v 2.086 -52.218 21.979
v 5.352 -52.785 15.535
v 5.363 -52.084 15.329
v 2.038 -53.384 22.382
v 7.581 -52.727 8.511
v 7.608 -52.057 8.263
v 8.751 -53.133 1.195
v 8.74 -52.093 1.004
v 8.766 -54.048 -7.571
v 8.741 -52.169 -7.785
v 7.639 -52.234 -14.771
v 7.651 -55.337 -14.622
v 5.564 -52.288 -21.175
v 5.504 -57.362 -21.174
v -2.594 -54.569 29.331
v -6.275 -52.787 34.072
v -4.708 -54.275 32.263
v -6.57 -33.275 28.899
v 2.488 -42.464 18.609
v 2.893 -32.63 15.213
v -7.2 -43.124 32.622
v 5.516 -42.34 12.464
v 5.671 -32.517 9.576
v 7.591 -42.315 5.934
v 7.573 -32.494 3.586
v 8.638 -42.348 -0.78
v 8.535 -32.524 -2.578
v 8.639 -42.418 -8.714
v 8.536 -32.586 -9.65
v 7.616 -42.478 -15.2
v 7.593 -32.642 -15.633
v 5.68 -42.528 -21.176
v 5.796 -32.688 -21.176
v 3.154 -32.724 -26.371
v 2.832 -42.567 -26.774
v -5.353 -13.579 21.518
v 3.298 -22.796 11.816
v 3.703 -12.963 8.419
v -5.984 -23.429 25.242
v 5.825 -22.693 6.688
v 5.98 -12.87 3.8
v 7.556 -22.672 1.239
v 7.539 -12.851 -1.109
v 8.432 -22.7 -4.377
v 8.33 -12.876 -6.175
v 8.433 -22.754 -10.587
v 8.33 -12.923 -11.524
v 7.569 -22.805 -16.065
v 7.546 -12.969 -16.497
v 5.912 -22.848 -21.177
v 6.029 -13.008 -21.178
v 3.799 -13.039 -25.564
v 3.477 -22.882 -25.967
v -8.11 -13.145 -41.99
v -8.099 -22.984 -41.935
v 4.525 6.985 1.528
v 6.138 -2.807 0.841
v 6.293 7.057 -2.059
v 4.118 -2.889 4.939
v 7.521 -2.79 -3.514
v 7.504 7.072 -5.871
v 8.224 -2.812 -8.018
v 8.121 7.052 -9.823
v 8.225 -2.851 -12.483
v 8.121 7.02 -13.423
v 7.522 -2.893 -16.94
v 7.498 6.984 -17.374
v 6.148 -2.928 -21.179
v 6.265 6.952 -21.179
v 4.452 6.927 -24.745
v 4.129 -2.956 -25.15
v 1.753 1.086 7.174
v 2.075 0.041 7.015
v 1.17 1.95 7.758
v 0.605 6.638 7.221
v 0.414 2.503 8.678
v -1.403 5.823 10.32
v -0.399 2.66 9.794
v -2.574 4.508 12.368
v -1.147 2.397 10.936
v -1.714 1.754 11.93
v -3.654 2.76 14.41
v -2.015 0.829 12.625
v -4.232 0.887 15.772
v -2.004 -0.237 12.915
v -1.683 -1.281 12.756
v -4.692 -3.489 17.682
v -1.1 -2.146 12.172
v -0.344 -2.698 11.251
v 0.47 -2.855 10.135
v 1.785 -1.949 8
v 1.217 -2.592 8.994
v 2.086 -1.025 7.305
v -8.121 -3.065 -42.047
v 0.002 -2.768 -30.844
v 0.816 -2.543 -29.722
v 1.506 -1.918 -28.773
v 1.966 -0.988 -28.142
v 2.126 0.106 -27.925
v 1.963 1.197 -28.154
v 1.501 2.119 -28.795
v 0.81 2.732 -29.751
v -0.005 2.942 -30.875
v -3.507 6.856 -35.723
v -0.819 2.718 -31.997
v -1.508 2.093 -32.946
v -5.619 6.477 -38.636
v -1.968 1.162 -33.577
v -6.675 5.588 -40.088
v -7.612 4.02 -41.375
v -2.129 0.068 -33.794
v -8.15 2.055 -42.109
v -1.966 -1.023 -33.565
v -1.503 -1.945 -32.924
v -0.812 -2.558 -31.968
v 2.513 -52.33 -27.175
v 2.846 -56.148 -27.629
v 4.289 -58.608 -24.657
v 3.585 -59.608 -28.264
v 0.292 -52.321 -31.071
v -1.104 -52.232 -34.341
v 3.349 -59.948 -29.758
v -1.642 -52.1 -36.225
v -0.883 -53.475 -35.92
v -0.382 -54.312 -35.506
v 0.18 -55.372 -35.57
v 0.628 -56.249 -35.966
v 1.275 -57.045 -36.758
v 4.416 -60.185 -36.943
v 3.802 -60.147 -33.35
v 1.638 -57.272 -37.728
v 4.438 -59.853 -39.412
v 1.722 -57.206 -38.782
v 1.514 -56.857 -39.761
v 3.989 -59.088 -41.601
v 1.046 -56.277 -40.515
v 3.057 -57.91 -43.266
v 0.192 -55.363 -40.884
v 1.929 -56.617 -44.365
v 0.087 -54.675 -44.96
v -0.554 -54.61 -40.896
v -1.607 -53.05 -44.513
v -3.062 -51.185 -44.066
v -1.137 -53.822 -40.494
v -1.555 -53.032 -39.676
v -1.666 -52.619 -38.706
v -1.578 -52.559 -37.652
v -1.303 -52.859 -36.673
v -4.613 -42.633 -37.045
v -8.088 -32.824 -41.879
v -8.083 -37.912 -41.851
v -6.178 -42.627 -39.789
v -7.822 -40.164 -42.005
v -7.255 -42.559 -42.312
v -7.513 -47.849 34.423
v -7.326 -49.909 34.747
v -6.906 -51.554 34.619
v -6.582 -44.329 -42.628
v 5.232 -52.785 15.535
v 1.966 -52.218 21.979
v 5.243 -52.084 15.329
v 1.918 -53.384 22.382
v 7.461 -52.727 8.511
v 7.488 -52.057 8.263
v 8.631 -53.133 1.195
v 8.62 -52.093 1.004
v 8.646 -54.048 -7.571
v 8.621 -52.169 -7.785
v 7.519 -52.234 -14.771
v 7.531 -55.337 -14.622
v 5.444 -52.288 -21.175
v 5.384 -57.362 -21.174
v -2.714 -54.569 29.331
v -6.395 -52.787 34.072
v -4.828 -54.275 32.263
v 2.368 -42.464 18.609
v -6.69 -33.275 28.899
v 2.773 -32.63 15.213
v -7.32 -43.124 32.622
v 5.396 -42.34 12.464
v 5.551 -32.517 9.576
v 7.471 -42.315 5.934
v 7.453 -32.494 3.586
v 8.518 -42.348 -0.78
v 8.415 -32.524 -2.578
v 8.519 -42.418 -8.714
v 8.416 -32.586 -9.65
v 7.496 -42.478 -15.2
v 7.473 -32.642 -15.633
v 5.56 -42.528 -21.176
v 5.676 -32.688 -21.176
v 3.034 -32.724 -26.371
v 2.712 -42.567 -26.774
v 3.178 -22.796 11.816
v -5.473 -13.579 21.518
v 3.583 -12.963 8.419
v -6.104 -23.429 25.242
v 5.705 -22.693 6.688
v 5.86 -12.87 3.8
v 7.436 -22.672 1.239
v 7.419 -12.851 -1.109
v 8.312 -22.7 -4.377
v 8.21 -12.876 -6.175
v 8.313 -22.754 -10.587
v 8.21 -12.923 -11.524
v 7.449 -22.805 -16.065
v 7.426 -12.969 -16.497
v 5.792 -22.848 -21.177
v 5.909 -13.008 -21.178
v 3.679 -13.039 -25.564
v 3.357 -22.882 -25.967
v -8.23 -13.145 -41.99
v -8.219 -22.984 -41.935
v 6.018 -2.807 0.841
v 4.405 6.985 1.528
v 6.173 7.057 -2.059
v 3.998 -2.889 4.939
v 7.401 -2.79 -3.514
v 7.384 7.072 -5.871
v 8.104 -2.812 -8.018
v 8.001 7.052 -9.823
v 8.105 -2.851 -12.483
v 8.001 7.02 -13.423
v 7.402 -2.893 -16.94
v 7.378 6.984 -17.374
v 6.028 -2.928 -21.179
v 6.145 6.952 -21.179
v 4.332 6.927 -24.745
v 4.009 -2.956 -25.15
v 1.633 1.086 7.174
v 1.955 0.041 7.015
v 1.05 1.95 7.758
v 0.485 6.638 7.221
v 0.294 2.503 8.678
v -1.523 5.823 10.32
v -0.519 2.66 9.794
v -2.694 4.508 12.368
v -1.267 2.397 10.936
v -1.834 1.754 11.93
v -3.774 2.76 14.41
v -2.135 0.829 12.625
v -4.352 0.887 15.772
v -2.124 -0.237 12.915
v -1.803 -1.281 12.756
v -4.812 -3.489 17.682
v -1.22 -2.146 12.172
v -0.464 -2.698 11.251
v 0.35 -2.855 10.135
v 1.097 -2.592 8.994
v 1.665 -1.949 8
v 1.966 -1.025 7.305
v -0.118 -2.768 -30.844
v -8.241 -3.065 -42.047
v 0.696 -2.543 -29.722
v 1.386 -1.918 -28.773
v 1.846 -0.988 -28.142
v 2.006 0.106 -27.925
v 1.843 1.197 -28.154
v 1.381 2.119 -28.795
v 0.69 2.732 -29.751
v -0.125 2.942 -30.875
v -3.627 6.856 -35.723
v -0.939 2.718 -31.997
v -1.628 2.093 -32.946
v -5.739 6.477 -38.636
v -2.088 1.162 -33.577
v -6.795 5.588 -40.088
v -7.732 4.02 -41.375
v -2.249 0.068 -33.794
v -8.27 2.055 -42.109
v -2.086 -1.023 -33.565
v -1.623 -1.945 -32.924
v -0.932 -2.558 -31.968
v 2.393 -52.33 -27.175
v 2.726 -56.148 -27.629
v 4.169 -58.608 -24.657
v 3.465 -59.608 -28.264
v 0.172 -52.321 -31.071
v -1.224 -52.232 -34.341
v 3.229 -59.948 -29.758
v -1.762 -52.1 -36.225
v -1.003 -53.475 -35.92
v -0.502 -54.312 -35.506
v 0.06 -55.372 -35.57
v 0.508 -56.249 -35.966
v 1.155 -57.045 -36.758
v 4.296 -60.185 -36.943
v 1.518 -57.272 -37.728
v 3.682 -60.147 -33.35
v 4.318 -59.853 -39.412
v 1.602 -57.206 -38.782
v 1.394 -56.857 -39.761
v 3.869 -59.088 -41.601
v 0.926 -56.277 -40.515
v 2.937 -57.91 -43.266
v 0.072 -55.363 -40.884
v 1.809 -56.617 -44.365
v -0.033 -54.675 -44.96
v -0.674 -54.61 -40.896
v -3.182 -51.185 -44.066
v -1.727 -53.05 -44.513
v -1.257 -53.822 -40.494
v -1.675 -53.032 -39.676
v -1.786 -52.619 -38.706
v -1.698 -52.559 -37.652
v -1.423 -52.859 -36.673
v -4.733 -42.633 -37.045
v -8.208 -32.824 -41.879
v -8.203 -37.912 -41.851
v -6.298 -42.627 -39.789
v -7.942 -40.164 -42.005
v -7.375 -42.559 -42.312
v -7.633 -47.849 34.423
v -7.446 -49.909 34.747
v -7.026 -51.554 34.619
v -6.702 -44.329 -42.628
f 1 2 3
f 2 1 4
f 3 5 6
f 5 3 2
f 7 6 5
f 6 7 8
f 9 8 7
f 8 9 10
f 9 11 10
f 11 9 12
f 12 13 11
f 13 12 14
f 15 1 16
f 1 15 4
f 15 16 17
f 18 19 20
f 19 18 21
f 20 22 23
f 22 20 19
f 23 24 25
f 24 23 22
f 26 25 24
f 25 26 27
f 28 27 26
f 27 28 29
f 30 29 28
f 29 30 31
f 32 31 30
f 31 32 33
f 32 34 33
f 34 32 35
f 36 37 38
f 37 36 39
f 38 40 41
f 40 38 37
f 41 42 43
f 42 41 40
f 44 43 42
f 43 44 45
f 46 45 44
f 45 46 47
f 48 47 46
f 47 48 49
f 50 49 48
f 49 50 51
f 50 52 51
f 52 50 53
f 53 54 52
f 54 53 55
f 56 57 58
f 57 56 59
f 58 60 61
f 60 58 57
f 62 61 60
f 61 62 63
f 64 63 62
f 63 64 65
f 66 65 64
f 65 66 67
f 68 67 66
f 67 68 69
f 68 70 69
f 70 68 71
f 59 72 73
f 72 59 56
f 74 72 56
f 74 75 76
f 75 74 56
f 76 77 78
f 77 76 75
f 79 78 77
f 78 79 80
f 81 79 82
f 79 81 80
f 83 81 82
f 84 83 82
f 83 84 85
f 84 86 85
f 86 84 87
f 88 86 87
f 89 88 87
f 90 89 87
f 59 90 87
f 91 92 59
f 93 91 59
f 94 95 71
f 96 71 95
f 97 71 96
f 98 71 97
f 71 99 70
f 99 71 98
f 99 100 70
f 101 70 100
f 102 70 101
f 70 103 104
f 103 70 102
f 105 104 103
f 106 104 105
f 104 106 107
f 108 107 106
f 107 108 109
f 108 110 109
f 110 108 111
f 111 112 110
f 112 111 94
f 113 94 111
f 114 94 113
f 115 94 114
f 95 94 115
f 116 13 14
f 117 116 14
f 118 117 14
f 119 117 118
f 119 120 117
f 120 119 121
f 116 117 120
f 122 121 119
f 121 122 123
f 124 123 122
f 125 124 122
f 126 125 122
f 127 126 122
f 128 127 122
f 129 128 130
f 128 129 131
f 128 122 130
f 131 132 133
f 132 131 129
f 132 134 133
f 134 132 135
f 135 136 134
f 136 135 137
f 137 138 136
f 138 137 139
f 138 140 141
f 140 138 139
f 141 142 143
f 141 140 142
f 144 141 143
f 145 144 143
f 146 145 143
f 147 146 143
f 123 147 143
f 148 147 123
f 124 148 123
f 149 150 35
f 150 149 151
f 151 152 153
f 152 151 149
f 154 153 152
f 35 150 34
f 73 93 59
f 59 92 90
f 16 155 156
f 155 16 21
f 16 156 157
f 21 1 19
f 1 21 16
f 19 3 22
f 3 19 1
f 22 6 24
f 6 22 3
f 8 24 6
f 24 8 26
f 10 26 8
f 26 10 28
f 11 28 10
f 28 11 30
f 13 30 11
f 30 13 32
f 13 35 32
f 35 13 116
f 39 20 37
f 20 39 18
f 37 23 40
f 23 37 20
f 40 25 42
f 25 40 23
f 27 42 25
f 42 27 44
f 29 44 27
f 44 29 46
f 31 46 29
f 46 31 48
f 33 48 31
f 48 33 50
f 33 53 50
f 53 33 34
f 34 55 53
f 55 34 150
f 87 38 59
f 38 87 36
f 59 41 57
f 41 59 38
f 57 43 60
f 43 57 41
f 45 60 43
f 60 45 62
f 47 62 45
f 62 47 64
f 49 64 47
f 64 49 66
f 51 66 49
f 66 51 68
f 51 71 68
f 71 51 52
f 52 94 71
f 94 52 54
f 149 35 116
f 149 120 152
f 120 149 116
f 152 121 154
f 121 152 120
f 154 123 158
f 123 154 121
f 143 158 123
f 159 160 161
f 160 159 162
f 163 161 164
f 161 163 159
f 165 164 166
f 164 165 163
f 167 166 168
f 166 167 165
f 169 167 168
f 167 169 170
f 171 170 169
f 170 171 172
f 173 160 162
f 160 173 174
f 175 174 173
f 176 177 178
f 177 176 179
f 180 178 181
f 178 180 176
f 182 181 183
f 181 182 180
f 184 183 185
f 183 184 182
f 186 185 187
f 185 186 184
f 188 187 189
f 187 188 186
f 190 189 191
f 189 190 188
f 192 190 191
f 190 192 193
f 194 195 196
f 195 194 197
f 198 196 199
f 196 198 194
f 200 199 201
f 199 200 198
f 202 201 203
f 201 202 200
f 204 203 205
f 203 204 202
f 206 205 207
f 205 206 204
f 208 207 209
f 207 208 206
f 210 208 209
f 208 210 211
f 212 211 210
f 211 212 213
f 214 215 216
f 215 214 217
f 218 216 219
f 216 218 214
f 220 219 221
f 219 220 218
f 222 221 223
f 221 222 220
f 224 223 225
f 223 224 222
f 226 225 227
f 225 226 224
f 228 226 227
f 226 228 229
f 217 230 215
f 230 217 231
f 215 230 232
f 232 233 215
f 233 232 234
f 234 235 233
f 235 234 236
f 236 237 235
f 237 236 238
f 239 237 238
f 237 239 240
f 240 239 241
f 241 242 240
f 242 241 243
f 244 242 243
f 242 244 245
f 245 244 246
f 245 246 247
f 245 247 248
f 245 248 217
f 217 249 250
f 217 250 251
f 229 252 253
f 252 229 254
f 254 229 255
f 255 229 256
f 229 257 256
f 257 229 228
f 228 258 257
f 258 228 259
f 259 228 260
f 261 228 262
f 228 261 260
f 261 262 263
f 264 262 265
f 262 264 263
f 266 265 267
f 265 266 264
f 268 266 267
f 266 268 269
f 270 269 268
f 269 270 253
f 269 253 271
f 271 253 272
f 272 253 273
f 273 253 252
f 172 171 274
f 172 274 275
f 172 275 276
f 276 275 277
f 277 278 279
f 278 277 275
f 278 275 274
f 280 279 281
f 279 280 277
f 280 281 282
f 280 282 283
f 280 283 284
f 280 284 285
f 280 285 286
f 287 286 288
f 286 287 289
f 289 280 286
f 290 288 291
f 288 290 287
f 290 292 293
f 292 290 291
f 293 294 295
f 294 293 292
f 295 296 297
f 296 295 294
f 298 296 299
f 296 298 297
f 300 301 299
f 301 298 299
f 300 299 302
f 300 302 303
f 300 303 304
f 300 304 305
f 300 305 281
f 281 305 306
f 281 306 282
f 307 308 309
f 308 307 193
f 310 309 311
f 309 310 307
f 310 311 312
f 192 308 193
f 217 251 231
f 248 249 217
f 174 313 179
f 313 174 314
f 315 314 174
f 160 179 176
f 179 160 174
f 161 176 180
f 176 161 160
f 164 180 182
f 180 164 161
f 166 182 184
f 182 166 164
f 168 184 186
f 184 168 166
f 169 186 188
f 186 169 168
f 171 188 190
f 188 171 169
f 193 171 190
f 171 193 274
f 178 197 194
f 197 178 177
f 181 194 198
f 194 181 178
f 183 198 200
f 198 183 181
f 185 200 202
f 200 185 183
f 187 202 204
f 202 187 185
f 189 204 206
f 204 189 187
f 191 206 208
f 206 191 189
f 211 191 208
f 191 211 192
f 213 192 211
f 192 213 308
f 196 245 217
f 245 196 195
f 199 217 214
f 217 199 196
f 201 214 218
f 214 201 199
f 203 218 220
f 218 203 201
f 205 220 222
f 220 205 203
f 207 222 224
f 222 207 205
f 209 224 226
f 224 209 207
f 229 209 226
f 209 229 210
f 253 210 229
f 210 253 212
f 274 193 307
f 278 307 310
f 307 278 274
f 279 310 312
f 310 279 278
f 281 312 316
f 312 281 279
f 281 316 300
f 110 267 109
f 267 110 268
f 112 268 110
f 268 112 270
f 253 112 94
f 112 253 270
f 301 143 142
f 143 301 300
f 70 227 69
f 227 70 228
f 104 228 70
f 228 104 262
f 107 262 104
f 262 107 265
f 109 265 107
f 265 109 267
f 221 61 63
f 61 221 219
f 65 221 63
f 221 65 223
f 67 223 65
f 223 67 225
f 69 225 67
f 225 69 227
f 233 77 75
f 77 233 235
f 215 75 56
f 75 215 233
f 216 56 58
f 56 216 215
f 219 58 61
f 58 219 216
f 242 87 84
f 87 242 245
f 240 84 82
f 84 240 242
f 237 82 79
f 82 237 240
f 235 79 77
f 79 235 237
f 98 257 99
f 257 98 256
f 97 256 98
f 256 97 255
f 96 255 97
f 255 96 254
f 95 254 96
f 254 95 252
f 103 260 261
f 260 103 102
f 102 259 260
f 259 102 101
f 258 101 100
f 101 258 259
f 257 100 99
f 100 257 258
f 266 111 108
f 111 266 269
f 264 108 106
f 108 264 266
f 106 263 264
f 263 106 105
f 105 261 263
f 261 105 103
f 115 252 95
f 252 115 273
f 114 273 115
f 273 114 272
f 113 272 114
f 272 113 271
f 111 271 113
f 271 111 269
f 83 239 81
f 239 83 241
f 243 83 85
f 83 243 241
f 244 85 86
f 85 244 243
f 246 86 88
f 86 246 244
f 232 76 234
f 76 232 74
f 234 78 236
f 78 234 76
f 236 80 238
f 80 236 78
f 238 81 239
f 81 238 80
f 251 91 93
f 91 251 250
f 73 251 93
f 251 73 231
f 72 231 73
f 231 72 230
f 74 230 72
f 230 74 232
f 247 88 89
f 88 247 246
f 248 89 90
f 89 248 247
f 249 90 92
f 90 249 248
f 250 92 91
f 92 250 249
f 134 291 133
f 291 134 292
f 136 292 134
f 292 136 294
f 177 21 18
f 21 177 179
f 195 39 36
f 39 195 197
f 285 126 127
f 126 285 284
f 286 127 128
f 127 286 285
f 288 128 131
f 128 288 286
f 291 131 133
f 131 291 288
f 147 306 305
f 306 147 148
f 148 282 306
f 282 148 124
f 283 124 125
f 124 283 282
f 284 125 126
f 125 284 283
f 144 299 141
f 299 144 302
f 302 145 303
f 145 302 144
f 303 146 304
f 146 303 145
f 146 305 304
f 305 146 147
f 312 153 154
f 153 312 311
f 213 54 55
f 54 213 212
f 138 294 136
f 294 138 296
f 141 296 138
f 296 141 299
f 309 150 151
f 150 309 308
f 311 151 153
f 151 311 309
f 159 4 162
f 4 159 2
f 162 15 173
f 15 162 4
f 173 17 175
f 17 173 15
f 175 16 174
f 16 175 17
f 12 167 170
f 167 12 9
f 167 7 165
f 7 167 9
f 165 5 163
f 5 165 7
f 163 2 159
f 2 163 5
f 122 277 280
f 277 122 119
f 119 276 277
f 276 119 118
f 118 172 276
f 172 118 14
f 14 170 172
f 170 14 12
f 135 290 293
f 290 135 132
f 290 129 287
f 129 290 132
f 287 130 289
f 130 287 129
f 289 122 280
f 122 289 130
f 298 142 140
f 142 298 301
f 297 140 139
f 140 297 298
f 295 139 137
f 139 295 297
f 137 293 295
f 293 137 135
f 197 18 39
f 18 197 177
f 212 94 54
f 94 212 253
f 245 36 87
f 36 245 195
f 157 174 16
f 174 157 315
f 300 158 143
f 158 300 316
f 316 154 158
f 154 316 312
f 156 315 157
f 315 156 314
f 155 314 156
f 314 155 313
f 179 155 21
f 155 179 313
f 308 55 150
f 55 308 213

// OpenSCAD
use <../lib.scad>
use <u768p01c01.scad>
function ldraw_lib__u768p01c02() = [
// 0 Sail 11 x  9 Trapezoidal with Stripes on White Background Pattern (Formed Shape 2)
// 0 Name: u768p01c02.dat
// 0 Author: Philippe Hurbain [Philo]
// 0 !LDRAW_ORG Part UPDATE 2024-05
// 0 !LICENSE Licensed under CC BY 4.0 : see CAreadme.txt
// 
// 0 !HELP Placement on mast:
// 0 !HELP 1 25 0 100 0 1 0 0 0 1 0 0 0 1 4318.dat
// 0 !HELP 1 25 0 92 -24 -1 0 0 0 1 0 0 0 -1 4319.dat
// 
// 0 BFC CERTIFY CCW
  [0,"BFC","CERTIFY"],
  [0,"BFC","CCW"],
// 
// 0 !CATEGORY Sheet Fabric
// 0 !KEYWORDS BrickLink sailbb24, Enchanted Island, Imperial Trading Post
// 0 !KEYWORDS King Kahuka's Throne, Lagoon Lock-Up, Rebrickable 70966pr0001
// 0 !KEYWORDS Rock Island Refuge, set 6262, set 6267, set 6273, set 6277, set 6278
// 0 !KEYWORDS set 6292
// 
// 0 !HISTORY 2024-06-30 [OrionP] Official Update 2024-05
// 
// 
// 1 16 0 0 0 -1 0 0 0 1 0 0 0 1 u768p01c01.dat
  [1,16,0,0,0,-1,0,0,0,1,0,0,0,1, ldraw_lib__u768p01c01()],
];
module ldraw_lib__u768p01c02(step=0, col=false, unit=2/5, alt=false, line=0.2, solid=!$preview)
    makepoly(ldraw_lib__u768p01c02(), step=step, col=col, unit=unit, alt=alt, line=line, solid=solid);
ldraw_lib__u768p01c02(line=0.2);
